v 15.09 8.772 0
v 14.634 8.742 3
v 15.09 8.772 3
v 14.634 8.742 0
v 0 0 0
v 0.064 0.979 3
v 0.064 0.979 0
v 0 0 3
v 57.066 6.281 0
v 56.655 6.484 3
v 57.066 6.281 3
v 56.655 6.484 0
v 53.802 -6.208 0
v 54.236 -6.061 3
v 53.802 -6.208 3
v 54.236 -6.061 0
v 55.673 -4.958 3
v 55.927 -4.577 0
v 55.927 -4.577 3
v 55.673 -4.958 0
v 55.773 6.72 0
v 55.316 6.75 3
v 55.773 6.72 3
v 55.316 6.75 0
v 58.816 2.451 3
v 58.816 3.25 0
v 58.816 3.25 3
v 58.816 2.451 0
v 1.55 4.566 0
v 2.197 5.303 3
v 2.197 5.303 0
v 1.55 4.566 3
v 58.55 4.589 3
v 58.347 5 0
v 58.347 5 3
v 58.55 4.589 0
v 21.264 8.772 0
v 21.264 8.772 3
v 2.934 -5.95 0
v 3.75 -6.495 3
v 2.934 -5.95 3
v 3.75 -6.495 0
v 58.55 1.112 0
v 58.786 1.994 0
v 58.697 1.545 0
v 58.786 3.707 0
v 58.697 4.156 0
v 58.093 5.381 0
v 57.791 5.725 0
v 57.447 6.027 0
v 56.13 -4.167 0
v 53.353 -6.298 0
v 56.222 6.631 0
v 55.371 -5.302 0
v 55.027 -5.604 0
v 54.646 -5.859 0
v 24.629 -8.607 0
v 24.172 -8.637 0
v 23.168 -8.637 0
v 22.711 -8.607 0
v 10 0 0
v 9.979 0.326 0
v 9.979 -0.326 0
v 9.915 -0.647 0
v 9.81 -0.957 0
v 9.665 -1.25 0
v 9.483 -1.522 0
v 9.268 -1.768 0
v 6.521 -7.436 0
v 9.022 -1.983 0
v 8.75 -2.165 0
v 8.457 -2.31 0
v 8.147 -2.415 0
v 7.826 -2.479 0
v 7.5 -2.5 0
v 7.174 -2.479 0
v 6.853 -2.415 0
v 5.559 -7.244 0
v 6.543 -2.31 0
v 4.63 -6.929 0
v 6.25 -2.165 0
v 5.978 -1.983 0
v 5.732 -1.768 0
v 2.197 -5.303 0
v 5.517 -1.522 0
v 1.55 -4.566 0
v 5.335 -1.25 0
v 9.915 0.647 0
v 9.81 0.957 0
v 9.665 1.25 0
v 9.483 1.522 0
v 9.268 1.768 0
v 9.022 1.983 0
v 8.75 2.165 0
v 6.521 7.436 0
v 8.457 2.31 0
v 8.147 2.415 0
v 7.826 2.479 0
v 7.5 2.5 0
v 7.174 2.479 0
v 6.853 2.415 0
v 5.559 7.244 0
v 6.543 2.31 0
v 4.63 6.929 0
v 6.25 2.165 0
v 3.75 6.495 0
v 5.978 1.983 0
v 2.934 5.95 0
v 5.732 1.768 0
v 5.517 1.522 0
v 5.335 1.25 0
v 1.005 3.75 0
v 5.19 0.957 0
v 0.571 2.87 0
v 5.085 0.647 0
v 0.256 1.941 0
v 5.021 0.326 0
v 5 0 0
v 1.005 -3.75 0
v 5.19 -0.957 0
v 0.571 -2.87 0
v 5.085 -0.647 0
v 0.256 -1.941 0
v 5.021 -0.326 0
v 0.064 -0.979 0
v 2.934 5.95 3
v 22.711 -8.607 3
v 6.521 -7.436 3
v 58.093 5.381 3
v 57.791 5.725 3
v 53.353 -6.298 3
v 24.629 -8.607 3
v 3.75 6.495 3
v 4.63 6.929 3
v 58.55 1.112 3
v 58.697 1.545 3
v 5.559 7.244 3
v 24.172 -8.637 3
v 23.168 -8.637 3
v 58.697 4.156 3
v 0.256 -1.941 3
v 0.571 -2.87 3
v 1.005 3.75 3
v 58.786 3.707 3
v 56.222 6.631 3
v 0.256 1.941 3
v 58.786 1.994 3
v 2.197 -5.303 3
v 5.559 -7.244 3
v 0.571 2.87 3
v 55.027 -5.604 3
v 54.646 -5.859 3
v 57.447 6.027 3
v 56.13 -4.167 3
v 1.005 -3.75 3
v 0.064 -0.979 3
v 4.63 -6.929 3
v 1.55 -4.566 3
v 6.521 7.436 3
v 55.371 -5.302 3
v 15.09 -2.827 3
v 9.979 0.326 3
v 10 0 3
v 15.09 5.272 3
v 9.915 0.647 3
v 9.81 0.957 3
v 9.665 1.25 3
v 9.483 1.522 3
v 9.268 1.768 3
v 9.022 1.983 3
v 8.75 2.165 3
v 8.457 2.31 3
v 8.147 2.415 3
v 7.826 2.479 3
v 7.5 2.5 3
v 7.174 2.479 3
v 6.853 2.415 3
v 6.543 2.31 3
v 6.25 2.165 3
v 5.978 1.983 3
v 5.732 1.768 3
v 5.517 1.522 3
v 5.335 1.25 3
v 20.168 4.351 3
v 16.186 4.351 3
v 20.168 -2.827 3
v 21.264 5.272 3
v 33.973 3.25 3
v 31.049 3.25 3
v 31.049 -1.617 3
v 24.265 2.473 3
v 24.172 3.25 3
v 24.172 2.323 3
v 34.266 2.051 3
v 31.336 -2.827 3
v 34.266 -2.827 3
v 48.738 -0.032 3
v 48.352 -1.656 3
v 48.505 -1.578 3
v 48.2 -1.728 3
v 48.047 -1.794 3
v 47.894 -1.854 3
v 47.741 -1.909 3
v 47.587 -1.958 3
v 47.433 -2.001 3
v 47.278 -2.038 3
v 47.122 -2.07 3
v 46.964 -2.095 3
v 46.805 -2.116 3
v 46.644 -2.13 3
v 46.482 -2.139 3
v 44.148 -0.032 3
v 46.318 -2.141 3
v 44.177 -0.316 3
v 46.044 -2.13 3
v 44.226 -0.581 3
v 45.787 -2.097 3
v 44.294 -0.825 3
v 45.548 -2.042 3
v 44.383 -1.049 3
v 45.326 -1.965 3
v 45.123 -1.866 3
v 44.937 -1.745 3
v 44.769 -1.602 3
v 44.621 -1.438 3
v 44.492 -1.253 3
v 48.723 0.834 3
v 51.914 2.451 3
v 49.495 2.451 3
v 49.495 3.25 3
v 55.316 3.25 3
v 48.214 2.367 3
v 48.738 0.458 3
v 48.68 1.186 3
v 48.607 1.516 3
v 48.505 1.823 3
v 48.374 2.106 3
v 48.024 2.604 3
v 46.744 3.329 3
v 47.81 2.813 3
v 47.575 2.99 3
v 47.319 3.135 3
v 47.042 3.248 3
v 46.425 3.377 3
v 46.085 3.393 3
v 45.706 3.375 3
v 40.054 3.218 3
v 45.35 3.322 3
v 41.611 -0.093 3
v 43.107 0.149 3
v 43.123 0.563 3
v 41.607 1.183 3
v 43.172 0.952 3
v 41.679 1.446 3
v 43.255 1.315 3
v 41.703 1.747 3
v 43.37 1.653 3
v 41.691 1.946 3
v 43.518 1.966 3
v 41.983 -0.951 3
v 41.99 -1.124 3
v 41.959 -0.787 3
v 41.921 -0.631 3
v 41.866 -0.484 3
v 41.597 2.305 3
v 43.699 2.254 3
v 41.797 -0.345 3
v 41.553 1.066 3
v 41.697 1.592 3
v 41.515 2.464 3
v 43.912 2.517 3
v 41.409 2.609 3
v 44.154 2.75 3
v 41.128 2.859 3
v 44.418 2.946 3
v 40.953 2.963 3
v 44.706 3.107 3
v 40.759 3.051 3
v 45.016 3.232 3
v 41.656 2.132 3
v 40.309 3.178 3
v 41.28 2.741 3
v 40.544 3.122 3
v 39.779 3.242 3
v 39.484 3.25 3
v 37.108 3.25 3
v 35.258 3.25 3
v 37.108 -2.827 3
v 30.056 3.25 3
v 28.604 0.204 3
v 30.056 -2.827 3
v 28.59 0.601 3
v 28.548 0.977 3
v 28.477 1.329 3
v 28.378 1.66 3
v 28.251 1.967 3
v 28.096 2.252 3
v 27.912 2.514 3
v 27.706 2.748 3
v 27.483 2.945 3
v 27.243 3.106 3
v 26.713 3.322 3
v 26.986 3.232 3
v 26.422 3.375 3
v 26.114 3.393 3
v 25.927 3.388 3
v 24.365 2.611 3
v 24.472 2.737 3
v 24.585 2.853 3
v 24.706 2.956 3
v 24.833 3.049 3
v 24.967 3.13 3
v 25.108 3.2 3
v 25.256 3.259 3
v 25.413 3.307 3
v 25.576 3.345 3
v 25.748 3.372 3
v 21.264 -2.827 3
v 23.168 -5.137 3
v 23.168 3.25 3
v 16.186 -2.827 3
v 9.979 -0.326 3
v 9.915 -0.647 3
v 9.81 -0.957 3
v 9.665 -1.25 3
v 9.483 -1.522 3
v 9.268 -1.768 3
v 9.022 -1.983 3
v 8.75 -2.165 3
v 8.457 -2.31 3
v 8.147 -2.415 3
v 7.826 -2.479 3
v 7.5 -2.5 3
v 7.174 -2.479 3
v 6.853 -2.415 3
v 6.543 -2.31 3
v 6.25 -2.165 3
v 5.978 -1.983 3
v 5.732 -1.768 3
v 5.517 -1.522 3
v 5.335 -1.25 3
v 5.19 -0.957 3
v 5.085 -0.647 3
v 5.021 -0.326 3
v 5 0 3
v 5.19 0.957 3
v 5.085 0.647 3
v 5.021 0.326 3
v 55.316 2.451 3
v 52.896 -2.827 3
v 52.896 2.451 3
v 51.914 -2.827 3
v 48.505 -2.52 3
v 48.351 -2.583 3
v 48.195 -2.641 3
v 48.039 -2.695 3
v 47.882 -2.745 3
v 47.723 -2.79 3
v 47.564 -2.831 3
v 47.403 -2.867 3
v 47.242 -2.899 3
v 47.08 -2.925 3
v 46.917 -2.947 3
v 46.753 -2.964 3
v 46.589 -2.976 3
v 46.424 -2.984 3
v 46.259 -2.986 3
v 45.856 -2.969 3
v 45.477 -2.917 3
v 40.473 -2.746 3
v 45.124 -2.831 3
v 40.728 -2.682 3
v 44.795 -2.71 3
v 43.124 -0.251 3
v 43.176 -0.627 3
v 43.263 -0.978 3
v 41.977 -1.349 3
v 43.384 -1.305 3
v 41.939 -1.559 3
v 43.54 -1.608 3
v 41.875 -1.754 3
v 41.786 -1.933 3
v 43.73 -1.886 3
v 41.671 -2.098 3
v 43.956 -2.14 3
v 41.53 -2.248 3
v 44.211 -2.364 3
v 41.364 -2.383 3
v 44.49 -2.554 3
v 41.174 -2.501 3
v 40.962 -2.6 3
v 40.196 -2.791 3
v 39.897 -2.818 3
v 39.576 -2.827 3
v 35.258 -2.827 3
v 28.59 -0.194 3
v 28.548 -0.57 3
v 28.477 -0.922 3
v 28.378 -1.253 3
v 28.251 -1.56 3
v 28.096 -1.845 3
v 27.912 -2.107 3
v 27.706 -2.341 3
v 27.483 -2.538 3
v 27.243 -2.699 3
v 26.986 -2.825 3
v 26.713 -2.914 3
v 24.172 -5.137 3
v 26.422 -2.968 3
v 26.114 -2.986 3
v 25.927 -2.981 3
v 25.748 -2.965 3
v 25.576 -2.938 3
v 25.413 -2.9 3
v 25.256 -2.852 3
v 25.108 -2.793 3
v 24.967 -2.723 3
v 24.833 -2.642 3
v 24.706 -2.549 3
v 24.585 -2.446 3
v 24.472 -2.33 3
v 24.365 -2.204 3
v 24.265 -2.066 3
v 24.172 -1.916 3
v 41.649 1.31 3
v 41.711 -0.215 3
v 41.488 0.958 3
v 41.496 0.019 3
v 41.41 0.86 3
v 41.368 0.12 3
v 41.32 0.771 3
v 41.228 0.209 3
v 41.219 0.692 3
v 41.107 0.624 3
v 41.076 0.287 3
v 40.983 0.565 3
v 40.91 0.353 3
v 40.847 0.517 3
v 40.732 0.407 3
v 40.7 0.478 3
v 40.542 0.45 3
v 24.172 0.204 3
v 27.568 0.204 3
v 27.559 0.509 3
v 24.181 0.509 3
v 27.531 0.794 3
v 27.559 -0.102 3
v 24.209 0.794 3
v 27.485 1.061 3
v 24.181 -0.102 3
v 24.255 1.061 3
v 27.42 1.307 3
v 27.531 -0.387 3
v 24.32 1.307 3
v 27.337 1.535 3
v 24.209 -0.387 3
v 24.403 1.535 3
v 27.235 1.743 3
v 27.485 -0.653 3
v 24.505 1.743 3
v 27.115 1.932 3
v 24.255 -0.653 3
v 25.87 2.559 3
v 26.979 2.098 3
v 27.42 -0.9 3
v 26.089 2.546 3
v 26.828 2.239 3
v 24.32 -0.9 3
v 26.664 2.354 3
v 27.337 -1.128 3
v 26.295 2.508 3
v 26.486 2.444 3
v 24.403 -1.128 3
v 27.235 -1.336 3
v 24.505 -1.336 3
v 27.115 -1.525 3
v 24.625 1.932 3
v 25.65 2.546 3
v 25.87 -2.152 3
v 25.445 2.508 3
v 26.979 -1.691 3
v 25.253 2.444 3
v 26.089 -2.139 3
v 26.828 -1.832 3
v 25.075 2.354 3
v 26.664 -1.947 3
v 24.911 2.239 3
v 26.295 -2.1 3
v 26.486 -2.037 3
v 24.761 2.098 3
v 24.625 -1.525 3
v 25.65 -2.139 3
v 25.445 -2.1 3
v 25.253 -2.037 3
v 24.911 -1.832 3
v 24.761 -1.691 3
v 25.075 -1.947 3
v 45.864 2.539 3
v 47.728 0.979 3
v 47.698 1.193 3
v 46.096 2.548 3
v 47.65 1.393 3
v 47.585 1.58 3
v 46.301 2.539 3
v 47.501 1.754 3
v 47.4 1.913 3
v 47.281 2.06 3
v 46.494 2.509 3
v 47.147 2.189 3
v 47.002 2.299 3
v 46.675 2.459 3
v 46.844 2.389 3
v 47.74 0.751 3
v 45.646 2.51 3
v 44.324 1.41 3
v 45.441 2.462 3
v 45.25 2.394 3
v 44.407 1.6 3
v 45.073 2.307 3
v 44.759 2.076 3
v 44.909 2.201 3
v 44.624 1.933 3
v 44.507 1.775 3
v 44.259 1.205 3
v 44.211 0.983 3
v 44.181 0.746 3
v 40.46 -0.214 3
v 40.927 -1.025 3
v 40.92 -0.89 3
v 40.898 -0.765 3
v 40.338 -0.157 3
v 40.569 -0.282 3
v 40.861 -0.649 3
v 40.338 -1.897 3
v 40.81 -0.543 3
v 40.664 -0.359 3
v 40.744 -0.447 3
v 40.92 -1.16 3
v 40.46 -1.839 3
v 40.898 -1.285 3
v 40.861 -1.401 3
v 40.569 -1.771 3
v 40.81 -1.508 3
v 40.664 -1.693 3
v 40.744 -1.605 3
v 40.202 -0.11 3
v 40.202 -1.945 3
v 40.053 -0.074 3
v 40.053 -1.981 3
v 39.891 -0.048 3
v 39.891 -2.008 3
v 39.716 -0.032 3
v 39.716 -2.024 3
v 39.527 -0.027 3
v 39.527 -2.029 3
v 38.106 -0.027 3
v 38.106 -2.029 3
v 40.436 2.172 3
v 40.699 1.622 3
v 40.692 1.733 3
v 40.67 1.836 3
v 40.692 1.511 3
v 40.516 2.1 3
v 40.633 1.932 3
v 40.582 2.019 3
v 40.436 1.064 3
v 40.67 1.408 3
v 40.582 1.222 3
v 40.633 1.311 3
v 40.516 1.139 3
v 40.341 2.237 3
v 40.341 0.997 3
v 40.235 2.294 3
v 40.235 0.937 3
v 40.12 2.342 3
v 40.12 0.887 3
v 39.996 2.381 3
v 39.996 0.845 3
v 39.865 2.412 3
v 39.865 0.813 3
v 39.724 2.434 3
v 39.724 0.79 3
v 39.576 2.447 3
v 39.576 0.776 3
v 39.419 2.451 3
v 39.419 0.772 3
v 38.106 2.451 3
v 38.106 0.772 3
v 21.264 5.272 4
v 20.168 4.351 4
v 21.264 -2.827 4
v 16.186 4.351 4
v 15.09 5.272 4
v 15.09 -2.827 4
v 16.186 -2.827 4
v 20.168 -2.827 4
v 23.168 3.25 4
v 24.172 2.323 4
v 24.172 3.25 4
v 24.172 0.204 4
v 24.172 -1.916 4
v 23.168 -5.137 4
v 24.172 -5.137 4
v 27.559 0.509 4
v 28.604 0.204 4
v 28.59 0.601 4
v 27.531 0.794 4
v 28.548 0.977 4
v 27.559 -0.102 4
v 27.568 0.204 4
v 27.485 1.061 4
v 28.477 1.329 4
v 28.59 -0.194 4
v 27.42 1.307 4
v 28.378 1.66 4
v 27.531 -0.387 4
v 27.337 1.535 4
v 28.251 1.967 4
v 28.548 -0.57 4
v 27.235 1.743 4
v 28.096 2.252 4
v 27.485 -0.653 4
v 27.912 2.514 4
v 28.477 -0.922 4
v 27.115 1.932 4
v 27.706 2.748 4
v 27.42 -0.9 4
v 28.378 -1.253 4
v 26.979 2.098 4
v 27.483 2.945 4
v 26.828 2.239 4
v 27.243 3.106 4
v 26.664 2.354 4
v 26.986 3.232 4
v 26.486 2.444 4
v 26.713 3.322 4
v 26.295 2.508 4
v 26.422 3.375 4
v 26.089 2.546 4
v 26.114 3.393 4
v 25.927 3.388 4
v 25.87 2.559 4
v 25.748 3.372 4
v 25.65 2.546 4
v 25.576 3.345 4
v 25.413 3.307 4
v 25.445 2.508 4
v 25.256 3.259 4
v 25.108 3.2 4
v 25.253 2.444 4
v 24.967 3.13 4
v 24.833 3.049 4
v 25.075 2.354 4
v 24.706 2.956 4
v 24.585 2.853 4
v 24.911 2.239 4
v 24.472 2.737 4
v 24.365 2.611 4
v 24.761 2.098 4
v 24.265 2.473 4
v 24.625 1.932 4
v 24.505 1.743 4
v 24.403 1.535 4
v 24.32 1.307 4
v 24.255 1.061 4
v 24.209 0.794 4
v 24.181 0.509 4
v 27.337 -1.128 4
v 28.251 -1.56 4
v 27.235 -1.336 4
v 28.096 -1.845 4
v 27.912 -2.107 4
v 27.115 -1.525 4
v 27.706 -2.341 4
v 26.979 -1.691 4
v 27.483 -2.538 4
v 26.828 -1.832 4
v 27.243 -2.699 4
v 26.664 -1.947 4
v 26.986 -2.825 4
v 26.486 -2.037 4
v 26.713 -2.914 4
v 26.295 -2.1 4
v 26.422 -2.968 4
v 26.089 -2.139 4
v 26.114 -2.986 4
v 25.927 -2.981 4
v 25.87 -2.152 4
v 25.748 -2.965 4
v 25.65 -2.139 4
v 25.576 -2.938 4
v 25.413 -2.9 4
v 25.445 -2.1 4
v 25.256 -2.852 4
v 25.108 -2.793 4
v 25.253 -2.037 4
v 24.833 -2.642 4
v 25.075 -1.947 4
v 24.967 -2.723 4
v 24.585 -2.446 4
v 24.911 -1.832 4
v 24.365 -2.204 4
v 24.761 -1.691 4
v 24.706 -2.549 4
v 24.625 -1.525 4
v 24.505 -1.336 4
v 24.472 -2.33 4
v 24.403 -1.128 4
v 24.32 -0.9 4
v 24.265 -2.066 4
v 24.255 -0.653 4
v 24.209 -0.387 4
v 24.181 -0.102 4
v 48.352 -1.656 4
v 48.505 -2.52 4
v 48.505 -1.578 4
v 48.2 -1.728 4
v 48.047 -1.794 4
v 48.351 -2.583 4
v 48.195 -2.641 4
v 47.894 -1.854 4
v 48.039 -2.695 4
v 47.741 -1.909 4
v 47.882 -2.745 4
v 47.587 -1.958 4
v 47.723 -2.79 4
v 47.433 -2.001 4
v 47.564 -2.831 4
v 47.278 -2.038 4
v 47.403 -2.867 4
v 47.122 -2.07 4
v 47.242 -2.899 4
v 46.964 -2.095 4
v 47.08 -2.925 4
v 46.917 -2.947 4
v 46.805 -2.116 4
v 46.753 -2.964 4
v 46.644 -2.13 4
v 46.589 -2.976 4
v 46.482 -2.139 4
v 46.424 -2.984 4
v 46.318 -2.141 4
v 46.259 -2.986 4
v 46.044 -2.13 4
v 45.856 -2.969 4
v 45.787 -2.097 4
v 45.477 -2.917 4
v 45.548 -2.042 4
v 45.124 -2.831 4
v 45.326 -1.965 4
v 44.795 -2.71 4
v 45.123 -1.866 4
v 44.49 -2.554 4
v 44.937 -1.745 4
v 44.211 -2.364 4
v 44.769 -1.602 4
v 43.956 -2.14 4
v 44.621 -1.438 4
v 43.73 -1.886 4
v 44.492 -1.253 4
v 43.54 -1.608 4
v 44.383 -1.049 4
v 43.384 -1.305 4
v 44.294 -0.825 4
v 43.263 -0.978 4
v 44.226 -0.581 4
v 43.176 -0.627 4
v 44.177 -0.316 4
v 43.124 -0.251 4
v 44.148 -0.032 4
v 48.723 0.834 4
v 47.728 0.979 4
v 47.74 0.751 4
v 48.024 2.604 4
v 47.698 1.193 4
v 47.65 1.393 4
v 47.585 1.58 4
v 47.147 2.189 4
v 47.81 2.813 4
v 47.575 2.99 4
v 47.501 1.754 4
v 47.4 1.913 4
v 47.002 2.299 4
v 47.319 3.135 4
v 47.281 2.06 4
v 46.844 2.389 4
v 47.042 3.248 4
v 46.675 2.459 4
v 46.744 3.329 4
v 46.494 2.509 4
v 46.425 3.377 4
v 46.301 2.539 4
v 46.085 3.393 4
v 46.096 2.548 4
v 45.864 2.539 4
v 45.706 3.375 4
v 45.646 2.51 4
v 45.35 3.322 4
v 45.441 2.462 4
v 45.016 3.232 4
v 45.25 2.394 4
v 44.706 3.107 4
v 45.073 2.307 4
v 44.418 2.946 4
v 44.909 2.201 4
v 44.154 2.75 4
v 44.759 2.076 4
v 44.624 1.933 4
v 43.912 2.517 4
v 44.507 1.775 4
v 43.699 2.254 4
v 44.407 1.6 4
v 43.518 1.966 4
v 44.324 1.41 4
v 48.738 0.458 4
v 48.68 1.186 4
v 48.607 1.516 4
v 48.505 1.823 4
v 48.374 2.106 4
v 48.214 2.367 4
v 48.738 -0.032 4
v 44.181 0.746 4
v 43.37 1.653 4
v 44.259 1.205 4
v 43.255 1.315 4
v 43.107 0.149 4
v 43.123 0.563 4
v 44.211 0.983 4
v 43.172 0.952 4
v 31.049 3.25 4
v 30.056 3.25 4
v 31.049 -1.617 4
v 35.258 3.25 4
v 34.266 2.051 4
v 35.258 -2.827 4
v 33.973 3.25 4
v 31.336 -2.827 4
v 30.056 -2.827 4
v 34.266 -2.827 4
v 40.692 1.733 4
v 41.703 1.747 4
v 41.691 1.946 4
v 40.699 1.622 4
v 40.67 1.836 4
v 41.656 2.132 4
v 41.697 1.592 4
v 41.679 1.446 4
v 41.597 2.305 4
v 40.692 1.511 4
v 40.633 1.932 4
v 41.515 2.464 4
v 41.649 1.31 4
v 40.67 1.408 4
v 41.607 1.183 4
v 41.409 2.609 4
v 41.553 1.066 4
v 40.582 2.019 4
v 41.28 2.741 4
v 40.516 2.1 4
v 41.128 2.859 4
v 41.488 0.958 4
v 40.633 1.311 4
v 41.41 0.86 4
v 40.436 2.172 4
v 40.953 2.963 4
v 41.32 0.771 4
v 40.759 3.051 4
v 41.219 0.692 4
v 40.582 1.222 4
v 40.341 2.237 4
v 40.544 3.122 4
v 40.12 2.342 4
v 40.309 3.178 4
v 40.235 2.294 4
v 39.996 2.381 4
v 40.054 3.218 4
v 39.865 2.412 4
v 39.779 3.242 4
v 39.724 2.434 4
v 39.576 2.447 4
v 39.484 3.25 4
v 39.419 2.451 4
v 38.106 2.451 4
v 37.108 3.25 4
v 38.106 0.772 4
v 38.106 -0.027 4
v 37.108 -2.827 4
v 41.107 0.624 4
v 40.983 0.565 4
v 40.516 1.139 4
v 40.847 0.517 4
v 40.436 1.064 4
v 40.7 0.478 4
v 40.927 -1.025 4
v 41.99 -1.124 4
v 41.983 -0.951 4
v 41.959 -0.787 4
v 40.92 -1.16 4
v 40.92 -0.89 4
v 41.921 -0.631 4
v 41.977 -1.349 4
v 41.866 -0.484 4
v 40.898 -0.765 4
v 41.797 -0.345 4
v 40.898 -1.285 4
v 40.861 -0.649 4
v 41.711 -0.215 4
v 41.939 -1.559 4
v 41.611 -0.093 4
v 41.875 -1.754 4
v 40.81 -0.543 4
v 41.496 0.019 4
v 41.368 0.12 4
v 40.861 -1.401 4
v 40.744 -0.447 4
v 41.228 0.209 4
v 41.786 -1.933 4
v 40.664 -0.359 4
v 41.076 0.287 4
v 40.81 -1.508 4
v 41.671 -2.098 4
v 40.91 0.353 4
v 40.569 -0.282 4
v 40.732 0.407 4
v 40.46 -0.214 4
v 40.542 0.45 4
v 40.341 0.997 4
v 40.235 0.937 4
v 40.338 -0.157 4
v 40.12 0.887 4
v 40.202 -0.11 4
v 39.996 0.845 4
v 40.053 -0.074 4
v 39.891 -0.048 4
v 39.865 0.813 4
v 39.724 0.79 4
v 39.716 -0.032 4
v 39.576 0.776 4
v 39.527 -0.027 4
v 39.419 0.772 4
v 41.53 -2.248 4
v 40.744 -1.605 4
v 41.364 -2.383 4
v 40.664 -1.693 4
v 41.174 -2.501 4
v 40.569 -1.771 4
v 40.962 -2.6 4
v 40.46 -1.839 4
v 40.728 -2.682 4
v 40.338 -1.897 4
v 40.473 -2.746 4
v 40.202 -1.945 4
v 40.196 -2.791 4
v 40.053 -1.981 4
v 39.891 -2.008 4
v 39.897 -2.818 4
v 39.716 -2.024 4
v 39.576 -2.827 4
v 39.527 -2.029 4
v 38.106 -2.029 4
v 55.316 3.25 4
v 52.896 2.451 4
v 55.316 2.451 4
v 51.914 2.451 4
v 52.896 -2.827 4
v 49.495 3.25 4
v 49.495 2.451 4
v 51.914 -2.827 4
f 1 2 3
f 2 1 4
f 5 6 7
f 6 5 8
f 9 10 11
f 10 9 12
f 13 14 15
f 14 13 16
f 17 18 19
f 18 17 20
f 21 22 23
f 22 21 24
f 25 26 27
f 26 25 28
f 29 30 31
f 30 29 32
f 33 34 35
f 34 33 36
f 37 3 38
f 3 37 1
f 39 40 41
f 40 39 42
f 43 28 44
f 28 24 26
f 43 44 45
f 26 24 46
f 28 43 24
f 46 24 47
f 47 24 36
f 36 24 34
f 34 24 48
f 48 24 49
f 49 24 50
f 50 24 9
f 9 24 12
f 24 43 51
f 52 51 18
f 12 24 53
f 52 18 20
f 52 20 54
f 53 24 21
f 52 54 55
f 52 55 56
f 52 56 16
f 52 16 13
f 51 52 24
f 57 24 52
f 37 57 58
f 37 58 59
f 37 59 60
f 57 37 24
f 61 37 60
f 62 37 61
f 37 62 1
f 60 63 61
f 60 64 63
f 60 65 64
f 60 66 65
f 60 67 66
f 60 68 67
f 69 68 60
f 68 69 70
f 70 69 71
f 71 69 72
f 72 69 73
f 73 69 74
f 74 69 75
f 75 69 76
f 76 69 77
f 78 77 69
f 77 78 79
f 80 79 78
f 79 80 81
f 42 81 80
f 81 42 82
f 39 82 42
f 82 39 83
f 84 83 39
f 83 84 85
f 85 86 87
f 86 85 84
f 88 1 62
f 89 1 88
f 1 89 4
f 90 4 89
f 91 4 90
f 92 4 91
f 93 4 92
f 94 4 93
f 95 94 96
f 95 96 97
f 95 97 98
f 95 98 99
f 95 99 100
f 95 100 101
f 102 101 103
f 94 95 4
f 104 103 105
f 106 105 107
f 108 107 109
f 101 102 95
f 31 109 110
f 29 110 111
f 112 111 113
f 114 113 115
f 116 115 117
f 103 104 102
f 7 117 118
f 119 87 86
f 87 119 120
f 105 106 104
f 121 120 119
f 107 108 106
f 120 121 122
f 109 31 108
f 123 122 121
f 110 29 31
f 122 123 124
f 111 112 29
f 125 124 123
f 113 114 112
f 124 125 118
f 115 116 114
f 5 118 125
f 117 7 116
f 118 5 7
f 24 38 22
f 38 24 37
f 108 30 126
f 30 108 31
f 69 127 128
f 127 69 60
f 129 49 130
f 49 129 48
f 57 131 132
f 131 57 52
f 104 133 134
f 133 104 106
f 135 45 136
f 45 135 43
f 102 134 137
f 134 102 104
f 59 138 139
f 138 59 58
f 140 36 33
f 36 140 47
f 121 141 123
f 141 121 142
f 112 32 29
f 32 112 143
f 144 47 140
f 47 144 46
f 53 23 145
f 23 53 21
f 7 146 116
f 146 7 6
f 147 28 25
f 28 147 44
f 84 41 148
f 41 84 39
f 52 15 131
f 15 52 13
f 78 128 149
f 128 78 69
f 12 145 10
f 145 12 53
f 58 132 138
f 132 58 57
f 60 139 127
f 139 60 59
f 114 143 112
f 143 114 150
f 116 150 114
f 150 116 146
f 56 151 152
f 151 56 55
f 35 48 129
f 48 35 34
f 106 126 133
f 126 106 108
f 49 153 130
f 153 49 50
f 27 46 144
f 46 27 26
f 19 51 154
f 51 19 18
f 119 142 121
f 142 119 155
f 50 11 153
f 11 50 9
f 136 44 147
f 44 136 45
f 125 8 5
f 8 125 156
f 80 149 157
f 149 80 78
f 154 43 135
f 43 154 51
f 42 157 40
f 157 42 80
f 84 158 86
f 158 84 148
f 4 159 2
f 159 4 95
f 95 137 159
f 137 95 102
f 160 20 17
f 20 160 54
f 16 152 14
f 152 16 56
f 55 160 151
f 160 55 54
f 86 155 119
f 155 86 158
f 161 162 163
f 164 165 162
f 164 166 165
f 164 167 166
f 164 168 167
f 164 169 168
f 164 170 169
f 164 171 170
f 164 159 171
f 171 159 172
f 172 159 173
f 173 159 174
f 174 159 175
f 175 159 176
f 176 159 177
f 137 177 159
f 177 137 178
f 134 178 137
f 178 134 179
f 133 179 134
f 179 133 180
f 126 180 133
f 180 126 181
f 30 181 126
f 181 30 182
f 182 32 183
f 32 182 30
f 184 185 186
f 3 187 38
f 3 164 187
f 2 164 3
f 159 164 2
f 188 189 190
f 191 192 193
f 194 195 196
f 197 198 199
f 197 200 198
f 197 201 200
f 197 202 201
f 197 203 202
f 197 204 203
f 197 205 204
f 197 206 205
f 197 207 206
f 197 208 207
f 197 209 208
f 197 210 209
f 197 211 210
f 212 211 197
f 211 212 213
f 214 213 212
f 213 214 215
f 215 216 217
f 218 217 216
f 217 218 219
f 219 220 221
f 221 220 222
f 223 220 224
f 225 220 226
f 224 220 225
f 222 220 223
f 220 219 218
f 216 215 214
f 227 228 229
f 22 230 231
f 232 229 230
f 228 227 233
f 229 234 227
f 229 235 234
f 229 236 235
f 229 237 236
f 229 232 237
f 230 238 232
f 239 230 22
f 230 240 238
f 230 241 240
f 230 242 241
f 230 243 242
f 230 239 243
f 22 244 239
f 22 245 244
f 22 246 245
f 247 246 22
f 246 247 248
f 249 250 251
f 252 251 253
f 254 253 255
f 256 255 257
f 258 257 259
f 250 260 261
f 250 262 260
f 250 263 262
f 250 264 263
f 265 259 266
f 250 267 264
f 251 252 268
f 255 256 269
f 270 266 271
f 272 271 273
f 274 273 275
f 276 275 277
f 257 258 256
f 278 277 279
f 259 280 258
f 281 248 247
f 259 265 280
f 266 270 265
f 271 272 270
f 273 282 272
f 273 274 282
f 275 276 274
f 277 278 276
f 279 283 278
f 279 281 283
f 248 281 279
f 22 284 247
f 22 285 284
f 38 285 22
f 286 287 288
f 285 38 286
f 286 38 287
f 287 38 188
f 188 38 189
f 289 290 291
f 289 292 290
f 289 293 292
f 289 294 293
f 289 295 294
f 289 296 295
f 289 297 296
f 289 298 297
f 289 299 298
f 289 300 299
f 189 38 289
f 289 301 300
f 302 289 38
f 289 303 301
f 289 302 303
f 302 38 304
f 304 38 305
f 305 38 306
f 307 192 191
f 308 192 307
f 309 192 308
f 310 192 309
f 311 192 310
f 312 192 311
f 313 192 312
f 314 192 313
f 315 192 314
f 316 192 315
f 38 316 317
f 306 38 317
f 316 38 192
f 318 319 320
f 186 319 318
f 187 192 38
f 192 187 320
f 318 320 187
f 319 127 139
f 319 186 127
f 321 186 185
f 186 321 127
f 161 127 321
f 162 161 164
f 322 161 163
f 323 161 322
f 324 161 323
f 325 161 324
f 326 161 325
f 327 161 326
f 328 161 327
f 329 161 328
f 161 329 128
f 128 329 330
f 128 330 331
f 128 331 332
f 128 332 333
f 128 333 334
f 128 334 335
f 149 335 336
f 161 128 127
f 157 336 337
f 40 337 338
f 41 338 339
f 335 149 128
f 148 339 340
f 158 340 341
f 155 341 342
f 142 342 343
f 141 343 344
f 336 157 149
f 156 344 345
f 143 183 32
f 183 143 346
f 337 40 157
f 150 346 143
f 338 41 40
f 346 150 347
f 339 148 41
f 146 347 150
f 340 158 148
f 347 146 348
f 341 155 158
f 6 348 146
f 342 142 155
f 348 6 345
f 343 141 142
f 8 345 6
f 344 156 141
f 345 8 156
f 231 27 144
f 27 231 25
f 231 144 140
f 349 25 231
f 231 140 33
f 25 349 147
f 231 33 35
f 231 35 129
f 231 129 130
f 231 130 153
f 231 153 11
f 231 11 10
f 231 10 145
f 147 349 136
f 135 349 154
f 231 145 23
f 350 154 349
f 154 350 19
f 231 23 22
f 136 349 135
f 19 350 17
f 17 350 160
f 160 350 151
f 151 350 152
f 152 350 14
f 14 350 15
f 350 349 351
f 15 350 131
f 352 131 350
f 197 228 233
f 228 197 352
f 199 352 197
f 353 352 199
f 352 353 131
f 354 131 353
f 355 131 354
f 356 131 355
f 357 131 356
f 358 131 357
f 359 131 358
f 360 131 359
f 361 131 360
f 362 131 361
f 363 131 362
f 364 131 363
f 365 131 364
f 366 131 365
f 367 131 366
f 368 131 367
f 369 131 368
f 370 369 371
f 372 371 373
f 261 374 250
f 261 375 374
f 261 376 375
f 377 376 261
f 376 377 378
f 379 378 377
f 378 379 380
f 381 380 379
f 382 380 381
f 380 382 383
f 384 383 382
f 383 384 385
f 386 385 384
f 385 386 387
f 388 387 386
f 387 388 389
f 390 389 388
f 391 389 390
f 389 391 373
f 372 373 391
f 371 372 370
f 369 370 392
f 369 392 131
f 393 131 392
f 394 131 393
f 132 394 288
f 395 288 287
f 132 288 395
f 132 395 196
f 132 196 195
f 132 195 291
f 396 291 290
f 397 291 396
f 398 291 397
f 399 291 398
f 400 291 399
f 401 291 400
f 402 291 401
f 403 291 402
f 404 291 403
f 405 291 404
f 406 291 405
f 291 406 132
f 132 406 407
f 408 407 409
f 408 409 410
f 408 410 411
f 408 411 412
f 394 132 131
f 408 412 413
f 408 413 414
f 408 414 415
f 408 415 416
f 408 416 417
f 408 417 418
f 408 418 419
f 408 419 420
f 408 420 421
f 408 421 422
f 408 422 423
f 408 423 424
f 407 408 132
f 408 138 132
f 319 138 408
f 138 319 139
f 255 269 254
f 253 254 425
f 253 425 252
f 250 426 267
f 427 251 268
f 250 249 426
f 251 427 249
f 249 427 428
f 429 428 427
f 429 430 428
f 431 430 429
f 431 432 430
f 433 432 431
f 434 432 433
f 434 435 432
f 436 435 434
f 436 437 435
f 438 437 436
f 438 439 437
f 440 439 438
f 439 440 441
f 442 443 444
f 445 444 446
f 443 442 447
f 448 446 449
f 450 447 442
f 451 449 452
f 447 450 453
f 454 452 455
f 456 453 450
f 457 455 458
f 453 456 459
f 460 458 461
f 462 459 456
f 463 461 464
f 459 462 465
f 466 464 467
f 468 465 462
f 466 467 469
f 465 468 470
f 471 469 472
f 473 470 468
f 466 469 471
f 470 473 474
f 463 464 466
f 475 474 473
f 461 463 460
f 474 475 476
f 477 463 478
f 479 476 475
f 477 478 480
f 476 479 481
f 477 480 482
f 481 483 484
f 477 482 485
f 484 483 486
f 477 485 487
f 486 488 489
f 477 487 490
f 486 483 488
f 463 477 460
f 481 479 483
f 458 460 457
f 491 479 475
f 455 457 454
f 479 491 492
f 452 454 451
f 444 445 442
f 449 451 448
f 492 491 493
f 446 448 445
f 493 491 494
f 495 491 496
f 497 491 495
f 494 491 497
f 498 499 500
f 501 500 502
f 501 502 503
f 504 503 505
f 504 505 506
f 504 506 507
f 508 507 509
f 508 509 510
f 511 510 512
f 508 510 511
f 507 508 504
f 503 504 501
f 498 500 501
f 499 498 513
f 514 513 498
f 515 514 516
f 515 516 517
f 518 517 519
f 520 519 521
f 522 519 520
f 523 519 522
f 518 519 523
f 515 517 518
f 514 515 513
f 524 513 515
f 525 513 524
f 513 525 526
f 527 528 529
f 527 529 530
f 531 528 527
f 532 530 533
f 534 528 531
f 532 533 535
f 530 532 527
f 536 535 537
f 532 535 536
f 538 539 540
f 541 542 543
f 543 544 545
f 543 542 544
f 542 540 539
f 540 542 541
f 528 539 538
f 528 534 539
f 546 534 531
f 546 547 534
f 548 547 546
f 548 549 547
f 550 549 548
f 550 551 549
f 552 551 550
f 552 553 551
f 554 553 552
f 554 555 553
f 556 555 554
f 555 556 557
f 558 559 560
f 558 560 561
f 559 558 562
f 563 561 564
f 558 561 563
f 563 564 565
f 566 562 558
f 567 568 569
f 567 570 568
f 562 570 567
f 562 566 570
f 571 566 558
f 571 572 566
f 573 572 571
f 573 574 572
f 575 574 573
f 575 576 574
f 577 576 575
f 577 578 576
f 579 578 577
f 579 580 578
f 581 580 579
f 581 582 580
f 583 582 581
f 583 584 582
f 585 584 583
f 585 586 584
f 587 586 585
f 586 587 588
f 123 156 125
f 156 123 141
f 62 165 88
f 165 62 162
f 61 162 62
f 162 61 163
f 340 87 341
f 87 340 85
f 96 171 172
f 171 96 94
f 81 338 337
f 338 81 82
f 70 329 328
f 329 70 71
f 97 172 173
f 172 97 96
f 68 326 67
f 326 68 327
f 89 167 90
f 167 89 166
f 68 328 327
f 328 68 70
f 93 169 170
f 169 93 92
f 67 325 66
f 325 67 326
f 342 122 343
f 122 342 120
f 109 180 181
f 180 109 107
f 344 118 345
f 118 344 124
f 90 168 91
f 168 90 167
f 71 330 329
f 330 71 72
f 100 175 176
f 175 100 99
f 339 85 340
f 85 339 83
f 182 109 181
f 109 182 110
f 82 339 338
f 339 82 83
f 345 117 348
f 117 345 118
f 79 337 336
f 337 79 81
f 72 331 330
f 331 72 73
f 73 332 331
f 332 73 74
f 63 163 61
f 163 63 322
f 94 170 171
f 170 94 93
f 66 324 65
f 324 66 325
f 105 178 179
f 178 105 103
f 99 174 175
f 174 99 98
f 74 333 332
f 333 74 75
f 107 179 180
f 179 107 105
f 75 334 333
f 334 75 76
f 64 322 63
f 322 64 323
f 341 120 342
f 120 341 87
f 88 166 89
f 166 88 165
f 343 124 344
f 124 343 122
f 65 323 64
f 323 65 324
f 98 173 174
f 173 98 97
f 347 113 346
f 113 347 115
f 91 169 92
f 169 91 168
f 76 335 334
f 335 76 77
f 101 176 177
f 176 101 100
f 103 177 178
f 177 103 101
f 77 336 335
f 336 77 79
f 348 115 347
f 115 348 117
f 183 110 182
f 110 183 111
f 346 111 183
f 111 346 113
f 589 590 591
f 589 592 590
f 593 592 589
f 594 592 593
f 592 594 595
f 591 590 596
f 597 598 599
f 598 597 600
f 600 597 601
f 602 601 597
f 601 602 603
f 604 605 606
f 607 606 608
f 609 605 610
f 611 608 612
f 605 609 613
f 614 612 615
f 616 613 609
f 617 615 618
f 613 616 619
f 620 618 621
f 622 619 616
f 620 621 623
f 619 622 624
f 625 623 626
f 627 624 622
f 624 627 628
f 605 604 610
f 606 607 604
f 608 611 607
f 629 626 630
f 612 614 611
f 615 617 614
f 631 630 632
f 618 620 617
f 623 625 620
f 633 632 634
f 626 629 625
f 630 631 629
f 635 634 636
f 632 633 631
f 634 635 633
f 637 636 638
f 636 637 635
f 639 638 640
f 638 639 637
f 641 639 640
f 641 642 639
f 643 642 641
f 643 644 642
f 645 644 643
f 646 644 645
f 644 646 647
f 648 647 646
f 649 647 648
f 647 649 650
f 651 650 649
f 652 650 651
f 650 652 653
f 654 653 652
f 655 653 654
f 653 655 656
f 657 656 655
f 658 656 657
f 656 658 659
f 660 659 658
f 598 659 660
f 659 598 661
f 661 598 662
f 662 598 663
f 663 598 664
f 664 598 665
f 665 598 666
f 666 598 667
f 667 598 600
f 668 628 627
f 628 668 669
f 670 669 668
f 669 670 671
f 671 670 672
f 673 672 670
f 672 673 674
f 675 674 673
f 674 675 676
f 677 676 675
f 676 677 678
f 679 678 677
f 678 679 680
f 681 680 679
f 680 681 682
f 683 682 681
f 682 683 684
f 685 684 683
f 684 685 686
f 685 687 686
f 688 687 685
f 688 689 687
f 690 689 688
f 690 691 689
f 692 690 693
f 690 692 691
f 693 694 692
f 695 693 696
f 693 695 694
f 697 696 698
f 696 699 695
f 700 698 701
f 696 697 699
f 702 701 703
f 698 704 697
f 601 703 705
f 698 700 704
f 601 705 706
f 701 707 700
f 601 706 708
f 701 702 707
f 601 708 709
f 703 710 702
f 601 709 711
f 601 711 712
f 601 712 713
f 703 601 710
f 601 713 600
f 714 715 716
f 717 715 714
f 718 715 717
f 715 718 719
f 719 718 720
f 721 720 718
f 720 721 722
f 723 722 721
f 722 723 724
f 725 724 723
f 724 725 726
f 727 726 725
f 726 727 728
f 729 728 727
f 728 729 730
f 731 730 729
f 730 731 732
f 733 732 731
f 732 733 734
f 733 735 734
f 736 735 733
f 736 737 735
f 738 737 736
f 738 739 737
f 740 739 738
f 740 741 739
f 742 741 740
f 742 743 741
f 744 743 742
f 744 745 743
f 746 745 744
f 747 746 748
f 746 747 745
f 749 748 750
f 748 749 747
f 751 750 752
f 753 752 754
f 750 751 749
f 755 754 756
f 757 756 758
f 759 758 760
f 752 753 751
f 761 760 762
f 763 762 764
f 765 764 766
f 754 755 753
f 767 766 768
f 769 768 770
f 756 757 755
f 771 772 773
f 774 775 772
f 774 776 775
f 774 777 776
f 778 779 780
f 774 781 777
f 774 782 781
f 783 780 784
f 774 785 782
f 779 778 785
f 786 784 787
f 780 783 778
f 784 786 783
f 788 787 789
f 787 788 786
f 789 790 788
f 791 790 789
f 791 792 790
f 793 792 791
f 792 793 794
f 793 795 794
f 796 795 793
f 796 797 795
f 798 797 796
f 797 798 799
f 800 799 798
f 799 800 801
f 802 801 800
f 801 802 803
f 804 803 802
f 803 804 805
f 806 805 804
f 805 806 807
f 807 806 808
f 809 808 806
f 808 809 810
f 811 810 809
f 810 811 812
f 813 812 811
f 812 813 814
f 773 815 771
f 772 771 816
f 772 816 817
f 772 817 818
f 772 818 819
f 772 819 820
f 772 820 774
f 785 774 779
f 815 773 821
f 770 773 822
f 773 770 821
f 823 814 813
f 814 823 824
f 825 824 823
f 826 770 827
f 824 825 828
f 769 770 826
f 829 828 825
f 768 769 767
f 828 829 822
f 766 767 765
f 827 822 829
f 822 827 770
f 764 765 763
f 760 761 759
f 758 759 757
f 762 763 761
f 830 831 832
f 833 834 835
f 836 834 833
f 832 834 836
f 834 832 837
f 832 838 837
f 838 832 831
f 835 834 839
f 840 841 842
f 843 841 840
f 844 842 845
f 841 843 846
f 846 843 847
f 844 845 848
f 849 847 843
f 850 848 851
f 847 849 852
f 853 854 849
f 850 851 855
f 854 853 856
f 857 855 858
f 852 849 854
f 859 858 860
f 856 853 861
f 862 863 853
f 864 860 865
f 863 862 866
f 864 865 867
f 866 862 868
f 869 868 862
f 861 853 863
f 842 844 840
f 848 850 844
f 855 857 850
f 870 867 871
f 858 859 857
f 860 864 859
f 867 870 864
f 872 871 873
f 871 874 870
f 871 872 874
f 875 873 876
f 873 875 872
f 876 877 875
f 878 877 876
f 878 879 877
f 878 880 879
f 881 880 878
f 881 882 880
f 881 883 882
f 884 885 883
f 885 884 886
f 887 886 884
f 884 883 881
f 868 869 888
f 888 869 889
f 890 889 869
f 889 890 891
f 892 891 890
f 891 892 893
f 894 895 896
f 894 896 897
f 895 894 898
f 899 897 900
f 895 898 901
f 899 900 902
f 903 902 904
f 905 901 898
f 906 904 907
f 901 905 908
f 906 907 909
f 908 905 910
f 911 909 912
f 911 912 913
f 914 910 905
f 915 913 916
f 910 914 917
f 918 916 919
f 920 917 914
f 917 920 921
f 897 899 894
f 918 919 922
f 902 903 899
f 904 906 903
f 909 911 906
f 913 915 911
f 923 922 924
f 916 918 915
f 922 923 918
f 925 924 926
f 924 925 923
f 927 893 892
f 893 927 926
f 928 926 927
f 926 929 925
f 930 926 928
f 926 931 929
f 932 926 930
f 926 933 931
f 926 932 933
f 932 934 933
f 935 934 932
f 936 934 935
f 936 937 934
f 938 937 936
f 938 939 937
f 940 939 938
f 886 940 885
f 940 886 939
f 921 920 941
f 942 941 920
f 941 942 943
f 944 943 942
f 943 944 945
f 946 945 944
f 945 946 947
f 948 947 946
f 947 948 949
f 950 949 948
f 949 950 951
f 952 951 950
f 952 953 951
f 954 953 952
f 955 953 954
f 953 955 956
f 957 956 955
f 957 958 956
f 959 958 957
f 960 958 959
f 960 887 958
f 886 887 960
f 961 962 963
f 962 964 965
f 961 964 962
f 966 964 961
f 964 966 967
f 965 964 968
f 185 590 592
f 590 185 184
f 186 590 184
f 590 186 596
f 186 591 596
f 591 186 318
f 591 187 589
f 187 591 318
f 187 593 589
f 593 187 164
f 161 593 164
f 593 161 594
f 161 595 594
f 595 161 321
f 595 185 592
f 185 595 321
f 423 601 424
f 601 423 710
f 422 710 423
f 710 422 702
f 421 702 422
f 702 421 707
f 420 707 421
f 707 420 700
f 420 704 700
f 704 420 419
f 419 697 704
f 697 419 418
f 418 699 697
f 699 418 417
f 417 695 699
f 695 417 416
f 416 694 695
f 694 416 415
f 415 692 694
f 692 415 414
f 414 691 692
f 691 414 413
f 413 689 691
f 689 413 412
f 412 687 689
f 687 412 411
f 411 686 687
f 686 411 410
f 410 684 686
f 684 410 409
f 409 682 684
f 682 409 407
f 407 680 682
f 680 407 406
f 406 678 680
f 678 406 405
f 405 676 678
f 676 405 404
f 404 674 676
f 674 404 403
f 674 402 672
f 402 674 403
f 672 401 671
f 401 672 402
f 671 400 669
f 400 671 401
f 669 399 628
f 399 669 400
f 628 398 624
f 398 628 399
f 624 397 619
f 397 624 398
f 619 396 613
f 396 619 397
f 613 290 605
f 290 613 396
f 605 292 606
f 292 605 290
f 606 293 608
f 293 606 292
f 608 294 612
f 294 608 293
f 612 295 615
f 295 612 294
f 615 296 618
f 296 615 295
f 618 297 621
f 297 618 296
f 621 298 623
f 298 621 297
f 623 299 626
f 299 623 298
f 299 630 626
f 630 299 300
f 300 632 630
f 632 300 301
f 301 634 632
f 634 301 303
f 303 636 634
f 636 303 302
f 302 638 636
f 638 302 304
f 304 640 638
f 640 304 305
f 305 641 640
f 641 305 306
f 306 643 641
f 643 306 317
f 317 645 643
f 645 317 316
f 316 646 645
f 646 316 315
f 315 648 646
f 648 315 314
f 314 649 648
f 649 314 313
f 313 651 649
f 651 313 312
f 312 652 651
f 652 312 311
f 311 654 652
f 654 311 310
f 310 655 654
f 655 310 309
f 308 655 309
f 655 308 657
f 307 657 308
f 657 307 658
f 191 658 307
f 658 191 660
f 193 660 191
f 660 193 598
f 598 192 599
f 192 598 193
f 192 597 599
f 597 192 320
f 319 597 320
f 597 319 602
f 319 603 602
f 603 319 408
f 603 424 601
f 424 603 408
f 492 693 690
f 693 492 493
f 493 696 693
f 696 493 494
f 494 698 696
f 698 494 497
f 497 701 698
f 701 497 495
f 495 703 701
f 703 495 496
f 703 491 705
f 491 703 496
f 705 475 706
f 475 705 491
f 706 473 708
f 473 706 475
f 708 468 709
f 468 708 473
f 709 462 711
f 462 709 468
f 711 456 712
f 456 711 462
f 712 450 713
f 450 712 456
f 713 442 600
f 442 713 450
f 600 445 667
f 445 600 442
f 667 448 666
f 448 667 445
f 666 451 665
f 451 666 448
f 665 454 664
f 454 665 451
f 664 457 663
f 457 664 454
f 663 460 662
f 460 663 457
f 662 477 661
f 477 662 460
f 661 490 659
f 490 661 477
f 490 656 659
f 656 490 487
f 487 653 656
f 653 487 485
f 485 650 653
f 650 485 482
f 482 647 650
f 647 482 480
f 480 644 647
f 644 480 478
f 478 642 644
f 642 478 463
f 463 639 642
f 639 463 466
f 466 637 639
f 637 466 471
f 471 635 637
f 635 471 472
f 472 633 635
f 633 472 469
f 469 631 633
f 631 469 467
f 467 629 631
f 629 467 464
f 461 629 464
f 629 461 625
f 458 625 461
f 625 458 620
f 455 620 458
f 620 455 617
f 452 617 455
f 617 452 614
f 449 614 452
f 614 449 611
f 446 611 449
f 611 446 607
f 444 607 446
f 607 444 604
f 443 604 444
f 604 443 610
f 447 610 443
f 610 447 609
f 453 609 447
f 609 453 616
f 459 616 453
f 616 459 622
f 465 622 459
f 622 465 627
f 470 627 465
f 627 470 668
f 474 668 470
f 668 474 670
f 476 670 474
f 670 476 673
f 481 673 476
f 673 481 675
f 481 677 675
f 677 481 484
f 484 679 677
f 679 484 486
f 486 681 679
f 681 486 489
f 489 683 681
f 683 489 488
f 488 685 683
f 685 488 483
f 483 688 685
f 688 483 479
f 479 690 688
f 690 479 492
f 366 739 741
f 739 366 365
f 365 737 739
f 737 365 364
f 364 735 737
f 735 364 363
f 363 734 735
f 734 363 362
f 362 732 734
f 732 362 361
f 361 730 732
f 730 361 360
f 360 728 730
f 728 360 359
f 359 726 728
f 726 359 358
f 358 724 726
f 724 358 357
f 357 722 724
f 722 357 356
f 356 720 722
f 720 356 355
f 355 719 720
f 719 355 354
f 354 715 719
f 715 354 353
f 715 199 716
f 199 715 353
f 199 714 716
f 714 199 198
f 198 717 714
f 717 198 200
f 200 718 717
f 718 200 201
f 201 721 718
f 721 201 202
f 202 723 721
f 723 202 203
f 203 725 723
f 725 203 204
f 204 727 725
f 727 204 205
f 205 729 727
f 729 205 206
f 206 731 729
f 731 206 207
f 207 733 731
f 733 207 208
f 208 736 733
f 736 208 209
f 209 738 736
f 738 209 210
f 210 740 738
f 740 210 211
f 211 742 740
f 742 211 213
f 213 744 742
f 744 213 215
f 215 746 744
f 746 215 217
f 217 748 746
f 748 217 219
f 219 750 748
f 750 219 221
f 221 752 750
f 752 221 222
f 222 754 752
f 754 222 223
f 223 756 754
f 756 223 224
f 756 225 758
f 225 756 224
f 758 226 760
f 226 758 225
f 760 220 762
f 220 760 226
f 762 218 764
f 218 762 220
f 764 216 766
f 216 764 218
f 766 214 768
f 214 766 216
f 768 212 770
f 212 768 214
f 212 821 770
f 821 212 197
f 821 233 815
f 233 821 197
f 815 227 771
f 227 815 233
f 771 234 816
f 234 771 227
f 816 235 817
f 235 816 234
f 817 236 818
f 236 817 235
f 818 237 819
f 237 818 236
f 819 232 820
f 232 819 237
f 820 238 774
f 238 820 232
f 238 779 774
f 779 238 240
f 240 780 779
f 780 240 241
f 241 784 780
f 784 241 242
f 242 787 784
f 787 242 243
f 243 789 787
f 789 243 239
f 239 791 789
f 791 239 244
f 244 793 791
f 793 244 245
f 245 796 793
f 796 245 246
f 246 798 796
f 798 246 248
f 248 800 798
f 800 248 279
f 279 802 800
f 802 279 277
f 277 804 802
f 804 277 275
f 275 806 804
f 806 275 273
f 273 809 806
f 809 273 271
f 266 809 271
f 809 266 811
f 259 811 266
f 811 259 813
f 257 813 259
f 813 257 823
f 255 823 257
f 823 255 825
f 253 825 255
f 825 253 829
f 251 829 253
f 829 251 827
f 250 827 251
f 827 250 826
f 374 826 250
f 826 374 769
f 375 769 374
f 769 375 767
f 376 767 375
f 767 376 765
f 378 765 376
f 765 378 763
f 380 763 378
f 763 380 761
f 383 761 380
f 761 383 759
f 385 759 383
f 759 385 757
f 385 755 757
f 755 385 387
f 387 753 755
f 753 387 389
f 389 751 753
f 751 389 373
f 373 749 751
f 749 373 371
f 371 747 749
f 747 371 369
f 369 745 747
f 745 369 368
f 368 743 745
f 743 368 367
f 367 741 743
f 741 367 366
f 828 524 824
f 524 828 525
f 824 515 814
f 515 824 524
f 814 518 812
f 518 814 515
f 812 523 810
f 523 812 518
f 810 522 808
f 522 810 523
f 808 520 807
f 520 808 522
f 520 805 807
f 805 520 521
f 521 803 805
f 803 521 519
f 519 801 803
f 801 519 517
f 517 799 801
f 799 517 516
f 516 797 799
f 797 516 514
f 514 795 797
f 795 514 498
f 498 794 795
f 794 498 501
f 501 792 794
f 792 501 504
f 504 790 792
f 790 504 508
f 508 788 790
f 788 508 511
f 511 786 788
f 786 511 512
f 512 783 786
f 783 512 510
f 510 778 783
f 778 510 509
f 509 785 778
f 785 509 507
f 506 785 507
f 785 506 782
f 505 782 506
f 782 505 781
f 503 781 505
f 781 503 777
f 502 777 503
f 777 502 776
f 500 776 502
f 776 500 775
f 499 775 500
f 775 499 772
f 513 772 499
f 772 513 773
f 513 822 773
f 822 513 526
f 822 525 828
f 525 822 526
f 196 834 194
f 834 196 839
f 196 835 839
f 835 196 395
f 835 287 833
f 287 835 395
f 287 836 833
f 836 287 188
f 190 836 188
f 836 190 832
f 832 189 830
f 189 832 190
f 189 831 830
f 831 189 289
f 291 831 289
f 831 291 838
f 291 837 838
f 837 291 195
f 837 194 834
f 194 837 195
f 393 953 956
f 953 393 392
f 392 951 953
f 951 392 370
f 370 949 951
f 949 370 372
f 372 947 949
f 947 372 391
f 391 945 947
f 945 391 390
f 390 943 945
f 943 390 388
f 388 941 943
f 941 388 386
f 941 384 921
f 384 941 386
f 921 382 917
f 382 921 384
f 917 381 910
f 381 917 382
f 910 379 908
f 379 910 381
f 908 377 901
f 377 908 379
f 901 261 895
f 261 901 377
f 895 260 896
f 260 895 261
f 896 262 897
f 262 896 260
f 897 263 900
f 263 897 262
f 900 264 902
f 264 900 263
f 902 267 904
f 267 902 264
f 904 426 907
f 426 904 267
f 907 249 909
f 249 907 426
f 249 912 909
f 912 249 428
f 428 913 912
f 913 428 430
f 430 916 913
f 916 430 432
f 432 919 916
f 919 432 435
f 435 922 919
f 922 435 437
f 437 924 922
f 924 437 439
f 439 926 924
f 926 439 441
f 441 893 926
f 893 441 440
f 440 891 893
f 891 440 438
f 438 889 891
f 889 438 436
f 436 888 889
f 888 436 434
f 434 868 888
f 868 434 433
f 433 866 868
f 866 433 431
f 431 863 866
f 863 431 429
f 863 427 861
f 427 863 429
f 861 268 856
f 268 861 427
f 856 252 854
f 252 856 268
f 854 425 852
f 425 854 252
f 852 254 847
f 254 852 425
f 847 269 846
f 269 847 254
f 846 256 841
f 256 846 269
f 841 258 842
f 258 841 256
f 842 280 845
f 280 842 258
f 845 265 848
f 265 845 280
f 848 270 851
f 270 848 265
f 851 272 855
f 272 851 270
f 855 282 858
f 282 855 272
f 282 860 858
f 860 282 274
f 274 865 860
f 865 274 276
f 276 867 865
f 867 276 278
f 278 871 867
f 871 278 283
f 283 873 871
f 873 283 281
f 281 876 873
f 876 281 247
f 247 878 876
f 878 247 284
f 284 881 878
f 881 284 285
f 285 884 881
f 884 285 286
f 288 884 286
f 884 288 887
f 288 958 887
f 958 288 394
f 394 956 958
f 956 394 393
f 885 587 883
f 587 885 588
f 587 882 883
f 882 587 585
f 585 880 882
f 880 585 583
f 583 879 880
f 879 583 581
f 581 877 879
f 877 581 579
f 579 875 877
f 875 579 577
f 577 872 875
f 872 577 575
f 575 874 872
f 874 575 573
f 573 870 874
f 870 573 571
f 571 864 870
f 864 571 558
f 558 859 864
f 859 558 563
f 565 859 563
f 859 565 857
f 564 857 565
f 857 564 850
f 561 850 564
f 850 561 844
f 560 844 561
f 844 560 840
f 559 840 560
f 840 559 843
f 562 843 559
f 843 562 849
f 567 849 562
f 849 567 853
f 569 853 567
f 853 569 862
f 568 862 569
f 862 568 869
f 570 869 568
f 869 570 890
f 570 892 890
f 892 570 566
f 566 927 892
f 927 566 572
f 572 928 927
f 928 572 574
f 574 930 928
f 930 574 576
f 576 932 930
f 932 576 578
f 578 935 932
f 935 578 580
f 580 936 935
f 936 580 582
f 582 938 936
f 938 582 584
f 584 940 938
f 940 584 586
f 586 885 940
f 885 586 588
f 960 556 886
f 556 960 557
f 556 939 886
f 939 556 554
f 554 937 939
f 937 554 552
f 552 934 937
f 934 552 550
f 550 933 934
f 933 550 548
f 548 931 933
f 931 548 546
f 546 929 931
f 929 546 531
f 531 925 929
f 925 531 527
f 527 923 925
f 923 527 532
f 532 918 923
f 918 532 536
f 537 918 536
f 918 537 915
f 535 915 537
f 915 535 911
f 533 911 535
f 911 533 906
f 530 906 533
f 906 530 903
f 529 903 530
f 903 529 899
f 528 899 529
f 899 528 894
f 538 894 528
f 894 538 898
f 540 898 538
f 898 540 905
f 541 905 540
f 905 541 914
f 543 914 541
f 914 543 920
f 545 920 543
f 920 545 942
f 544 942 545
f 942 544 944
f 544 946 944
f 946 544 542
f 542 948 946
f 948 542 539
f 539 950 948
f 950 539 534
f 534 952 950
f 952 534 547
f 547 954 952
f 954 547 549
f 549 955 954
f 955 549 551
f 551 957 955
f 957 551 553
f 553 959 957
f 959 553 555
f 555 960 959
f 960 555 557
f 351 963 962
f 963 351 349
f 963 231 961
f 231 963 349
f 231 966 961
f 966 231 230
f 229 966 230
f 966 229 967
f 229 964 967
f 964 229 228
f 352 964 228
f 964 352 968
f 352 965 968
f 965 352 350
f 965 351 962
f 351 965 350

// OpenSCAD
// Брелок с отверстием и выпуклой надписью. Форма обтягивает текст:
// длинное имя — длинный брелок, ничего не вылезает за край.
// Для надписи другим цветом — смена пластика на высоте толщины брелока.
$fn = 48;

/* [Надпись] */
// Текст
label = "Привет";
// Высота заглавных букв, мм
font_size = 8;          // [4:0.5:16]
// Надпись над брелоком, мм
text_height = 1;        // [0.4:0.2:2]
/* [Брелок] */
// Толщина, мм
thickness = 3;          // [2:0.5:6]
// Поля вокруг надписи, мм
margin = 3.5;           // [2:0.5:8]
/* [Отверстие] */
// Диаметр отверстия, мм
hole_diameter = 5;      // [3:0.5:8]

ring = max(hole_diameter + 6, font_size + 2 * margin);
hole_x = ring / 2;
text_x0 = ring - 1;

module words() {
    text(label, font = "Noto Sans", size = font_size, halign = "left", valign = "center");
}

module outline() {
    hull() {
        translate([hole_x, 0]) circle(d = ring);
        translate([text_x0, 0]) offset(r = margin) words();
    }
}

difference() {
    linear_extrude(height = thickness) outline();
    translate([hole_x, 0, -1])
        cylinder(h = thickness + 2, d = hole_diameter);
}
translate([text_x0, 0, thickness])
    linear_extrude(height = text_height) words();
